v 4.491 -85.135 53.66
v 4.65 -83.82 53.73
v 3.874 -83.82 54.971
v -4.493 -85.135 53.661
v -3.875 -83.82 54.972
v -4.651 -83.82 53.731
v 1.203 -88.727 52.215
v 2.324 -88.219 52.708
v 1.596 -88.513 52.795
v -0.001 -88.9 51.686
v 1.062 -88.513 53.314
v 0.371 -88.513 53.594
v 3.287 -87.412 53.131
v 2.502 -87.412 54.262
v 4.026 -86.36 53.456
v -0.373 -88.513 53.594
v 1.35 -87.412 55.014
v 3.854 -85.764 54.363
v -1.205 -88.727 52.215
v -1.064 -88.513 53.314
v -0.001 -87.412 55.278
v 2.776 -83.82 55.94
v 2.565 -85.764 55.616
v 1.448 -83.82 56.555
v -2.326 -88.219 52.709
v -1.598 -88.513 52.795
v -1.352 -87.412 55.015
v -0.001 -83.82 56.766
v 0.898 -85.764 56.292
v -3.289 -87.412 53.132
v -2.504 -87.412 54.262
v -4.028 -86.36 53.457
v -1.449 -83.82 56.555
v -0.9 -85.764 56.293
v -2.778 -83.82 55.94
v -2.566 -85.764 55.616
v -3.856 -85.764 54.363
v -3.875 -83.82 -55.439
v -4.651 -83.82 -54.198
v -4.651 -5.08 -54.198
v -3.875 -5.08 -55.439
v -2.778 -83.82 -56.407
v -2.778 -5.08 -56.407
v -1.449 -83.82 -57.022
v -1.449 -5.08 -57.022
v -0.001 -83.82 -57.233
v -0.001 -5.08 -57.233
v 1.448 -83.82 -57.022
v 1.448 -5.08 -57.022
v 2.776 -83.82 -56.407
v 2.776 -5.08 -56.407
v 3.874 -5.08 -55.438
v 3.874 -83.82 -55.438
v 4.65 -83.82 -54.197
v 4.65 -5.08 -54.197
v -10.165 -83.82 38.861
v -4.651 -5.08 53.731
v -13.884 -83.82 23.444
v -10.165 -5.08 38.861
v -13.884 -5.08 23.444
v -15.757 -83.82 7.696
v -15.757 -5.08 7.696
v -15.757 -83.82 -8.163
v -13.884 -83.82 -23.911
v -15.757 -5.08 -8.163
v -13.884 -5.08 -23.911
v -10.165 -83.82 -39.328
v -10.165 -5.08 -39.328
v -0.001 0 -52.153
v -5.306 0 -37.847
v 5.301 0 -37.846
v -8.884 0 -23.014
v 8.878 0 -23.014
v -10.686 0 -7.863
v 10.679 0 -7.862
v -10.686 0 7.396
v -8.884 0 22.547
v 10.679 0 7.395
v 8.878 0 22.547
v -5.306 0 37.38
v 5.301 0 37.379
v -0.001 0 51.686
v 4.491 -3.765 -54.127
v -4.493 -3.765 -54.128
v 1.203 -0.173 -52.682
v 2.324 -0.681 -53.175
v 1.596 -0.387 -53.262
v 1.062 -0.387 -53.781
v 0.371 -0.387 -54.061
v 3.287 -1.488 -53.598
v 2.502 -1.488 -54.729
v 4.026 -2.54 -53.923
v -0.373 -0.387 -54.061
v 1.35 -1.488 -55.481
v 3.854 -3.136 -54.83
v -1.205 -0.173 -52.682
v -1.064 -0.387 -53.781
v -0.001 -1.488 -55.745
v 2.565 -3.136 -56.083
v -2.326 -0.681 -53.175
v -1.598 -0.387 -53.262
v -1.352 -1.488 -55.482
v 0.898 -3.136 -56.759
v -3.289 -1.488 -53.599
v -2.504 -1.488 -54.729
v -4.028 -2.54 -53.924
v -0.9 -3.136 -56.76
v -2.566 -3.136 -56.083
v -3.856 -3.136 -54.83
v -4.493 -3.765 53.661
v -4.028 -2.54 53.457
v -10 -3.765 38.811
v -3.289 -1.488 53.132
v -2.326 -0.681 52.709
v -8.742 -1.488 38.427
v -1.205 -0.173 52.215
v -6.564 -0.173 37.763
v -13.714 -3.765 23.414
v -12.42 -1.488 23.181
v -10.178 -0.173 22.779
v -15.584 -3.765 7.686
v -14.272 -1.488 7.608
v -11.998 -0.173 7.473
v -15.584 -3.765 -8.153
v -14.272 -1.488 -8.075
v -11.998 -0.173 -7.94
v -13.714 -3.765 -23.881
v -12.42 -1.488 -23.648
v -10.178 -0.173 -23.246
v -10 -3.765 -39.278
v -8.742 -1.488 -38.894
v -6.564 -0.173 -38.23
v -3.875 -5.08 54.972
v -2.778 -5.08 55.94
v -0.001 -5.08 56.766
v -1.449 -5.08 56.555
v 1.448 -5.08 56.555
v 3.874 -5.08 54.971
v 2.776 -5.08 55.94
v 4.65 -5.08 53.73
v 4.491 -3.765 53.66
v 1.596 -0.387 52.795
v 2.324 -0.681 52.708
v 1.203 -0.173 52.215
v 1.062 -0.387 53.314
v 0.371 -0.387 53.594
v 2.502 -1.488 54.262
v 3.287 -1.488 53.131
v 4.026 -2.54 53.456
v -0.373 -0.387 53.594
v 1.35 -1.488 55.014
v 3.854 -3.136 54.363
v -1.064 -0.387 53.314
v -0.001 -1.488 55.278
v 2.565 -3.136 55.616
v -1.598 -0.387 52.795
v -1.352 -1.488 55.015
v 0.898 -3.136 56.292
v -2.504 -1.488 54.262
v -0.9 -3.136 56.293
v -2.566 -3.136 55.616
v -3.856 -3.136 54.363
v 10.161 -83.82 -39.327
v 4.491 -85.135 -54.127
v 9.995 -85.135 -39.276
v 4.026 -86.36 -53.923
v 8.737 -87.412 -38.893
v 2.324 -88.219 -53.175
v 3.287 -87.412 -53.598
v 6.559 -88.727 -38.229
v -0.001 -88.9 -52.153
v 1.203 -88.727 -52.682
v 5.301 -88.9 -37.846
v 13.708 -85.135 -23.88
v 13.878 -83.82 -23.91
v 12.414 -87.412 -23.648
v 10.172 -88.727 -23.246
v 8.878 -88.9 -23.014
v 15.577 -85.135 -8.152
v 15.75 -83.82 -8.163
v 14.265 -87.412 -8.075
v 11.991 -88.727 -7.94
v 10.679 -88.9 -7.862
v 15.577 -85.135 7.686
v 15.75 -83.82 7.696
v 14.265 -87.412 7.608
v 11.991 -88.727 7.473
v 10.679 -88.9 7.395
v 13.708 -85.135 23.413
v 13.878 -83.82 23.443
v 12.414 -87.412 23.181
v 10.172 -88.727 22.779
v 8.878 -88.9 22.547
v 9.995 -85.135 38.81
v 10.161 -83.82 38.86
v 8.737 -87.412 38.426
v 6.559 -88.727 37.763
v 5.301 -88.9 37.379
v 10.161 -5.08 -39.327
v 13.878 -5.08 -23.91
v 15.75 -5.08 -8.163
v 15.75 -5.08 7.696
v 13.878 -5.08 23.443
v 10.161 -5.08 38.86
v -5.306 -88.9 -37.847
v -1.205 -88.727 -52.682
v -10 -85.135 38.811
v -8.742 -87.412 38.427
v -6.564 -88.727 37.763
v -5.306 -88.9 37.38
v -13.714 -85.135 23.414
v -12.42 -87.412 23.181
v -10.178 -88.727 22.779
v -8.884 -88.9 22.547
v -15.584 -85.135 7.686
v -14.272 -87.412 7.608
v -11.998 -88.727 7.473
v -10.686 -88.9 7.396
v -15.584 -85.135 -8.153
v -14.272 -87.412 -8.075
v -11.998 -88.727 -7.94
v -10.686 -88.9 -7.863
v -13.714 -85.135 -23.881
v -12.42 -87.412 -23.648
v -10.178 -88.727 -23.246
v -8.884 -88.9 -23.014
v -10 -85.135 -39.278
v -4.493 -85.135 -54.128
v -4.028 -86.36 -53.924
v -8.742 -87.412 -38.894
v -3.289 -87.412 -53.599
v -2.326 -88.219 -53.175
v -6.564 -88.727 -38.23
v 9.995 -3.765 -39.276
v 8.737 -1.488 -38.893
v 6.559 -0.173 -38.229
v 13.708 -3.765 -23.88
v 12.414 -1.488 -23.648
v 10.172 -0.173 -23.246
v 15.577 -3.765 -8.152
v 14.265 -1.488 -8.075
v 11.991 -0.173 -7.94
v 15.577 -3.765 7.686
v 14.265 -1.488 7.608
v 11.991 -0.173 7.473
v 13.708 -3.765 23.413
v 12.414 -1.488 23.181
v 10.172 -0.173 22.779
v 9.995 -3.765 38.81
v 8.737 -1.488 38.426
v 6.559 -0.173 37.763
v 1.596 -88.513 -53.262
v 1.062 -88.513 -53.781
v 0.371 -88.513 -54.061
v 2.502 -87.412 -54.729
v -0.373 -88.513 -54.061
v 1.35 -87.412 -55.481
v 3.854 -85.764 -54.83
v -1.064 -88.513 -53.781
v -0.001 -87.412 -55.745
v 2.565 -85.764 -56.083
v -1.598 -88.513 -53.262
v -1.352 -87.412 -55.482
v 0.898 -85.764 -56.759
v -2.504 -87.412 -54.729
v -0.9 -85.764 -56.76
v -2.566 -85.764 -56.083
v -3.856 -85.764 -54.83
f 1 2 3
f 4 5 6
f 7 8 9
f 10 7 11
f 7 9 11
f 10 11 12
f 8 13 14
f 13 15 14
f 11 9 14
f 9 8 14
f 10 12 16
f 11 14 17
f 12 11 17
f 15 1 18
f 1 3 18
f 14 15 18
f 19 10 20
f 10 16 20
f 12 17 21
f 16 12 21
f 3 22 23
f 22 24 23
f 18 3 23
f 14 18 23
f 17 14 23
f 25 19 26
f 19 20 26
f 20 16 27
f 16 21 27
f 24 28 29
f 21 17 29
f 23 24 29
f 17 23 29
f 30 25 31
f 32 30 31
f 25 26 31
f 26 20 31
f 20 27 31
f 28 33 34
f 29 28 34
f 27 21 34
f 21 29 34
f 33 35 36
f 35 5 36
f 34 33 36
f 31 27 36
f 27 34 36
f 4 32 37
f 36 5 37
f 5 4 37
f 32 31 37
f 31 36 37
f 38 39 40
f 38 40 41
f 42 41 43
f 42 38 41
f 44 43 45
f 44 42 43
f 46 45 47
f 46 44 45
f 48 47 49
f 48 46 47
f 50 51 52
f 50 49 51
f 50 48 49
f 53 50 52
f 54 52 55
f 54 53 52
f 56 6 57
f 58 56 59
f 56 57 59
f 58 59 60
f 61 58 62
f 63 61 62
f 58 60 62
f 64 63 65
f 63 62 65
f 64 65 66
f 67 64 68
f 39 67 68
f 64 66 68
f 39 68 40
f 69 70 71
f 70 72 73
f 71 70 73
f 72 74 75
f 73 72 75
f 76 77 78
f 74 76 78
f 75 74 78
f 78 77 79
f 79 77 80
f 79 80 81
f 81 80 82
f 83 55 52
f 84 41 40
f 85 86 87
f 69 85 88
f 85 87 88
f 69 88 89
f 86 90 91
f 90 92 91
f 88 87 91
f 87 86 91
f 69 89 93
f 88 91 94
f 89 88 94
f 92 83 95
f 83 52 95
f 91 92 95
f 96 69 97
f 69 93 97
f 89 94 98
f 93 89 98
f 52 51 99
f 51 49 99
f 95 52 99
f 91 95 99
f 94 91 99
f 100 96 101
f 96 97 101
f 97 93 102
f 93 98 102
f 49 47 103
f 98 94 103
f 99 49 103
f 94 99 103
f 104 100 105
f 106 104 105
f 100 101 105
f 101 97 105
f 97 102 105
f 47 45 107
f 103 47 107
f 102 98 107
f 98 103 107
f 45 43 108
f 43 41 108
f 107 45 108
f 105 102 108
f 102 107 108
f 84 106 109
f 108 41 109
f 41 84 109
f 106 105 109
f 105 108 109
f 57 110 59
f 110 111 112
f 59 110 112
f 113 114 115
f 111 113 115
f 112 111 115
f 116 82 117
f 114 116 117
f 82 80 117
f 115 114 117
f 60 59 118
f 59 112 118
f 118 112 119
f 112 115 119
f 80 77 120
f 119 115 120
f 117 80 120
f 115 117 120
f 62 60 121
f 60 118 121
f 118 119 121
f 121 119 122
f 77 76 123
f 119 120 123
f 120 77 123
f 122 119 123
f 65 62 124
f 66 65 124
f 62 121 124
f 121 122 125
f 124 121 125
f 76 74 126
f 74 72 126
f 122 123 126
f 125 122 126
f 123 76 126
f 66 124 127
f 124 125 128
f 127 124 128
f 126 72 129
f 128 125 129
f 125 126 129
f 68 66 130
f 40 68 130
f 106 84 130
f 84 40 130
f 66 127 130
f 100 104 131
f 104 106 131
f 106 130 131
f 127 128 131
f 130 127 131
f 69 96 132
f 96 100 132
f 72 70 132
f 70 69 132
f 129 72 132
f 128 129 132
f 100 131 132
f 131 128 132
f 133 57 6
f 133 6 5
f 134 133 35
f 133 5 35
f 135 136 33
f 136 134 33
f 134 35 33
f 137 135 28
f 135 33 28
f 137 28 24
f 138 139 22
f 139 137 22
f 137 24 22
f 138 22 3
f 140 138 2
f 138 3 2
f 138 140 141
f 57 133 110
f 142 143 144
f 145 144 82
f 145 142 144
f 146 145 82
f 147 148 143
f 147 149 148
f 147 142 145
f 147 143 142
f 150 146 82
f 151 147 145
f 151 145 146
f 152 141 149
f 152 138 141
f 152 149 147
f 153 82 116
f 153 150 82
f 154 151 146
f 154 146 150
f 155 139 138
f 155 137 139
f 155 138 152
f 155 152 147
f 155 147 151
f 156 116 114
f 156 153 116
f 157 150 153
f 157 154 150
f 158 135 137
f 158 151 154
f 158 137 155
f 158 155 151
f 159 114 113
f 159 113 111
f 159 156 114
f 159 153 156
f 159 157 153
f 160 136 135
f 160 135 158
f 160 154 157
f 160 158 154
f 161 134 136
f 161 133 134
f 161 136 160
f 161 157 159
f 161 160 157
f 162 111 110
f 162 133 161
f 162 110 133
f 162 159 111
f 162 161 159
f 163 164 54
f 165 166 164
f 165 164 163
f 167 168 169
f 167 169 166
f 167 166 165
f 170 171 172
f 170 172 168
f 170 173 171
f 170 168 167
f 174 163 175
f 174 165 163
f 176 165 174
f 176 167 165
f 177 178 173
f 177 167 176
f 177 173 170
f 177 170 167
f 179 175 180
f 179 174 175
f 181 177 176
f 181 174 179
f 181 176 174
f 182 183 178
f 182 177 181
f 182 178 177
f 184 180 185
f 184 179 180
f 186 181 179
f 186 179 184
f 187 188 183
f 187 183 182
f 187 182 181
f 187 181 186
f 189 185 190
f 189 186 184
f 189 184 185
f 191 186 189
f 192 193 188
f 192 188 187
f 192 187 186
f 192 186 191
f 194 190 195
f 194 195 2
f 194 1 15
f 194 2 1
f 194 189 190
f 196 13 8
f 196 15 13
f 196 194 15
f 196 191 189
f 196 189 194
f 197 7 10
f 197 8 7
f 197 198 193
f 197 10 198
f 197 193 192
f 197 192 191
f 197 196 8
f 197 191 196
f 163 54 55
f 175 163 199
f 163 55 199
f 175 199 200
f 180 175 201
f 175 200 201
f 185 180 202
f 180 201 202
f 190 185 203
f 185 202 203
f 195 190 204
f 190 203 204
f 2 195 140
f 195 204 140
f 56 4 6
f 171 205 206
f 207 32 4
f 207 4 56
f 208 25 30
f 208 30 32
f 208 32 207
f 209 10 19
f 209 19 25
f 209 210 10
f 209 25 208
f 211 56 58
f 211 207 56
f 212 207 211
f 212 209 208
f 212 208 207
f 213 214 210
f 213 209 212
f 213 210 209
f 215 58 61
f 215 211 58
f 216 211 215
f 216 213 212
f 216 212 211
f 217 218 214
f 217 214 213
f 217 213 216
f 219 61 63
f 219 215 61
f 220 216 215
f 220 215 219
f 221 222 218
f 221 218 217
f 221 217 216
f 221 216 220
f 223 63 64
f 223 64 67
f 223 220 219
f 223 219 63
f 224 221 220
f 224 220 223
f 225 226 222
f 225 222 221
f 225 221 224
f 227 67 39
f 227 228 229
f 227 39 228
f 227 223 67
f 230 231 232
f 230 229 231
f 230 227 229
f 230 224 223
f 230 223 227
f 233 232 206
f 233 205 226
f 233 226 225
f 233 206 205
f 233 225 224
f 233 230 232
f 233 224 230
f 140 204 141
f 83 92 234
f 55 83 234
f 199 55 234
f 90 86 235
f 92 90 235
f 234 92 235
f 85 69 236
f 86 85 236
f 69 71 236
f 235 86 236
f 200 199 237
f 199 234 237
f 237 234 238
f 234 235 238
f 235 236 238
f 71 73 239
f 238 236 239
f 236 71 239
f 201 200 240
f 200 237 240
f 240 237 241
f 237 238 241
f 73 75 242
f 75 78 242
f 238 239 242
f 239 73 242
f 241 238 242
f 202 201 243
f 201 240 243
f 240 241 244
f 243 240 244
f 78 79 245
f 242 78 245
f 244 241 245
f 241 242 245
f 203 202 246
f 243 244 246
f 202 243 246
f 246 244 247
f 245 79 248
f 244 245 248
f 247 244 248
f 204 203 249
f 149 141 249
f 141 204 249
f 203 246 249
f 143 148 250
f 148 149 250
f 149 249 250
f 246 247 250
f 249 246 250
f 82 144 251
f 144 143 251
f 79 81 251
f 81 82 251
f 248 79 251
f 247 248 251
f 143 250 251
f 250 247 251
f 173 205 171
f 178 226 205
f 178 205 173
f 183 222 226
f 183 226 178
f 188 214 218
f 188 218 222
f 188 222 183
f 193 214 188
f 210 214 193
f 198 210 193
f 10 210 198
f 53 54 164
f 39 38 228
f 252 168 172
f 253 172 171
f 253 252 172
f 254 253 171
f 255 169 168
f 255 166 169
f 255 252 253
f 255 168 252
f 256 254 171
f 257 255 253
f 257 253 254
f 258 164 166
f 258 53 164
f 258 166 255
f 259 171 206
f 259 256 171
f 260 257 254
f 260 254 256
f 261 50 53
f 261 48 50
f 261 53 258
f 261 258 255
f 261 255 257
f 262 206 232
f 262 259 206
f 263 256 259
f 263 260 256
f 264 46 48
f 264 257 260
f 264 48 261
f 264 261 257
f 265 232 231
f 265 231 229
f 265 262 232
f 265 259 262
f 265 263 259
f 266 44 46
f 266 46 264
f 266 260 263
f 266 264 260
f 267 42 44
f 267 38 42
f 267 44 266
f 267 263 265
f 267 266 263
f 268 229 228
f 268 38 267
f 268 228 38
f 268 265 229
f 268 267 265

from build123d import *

# Parameters (mm, degrees)
F1_DEPTH = 88.9
F4_R     = 5.08


# Not quite as in the source:
# - a feature of the source that left no trace in its solid (it failed there, or was rolled back) is left out


with BuildPart() as f1:
    # F0 (on Front) → F1 (new body)
    with BuildSketch(Plane.XZ):
        with BuildLine():
            ThreePointArc((0, 63.2665448354), (-15.9917662052, -0.2334551646), (0, -63.7334551646))
            ThreePointArc((0, -63.7334551646), (15.9844327654, -0.2334551646), (0, 63.2665448354))
        make_face()
    extrude(amount=F1_DEPTH)

    # F4
    f4_edges = [f1.edges().sort_by_distance(p)[0] for p in [
        (0, -44.45, -63.733455),
        (0, -44.45, 63.266545),
        (15.984433, 0, -0.233455),
        (15.984433, -88.9, -0.233455),
        (-15.991766, 0, -0.233455),
        (-15.991766, -88.9, -0.233455),
    ]]
    fillet(f4_edges, radius=F4_R)


solid = f1.part
